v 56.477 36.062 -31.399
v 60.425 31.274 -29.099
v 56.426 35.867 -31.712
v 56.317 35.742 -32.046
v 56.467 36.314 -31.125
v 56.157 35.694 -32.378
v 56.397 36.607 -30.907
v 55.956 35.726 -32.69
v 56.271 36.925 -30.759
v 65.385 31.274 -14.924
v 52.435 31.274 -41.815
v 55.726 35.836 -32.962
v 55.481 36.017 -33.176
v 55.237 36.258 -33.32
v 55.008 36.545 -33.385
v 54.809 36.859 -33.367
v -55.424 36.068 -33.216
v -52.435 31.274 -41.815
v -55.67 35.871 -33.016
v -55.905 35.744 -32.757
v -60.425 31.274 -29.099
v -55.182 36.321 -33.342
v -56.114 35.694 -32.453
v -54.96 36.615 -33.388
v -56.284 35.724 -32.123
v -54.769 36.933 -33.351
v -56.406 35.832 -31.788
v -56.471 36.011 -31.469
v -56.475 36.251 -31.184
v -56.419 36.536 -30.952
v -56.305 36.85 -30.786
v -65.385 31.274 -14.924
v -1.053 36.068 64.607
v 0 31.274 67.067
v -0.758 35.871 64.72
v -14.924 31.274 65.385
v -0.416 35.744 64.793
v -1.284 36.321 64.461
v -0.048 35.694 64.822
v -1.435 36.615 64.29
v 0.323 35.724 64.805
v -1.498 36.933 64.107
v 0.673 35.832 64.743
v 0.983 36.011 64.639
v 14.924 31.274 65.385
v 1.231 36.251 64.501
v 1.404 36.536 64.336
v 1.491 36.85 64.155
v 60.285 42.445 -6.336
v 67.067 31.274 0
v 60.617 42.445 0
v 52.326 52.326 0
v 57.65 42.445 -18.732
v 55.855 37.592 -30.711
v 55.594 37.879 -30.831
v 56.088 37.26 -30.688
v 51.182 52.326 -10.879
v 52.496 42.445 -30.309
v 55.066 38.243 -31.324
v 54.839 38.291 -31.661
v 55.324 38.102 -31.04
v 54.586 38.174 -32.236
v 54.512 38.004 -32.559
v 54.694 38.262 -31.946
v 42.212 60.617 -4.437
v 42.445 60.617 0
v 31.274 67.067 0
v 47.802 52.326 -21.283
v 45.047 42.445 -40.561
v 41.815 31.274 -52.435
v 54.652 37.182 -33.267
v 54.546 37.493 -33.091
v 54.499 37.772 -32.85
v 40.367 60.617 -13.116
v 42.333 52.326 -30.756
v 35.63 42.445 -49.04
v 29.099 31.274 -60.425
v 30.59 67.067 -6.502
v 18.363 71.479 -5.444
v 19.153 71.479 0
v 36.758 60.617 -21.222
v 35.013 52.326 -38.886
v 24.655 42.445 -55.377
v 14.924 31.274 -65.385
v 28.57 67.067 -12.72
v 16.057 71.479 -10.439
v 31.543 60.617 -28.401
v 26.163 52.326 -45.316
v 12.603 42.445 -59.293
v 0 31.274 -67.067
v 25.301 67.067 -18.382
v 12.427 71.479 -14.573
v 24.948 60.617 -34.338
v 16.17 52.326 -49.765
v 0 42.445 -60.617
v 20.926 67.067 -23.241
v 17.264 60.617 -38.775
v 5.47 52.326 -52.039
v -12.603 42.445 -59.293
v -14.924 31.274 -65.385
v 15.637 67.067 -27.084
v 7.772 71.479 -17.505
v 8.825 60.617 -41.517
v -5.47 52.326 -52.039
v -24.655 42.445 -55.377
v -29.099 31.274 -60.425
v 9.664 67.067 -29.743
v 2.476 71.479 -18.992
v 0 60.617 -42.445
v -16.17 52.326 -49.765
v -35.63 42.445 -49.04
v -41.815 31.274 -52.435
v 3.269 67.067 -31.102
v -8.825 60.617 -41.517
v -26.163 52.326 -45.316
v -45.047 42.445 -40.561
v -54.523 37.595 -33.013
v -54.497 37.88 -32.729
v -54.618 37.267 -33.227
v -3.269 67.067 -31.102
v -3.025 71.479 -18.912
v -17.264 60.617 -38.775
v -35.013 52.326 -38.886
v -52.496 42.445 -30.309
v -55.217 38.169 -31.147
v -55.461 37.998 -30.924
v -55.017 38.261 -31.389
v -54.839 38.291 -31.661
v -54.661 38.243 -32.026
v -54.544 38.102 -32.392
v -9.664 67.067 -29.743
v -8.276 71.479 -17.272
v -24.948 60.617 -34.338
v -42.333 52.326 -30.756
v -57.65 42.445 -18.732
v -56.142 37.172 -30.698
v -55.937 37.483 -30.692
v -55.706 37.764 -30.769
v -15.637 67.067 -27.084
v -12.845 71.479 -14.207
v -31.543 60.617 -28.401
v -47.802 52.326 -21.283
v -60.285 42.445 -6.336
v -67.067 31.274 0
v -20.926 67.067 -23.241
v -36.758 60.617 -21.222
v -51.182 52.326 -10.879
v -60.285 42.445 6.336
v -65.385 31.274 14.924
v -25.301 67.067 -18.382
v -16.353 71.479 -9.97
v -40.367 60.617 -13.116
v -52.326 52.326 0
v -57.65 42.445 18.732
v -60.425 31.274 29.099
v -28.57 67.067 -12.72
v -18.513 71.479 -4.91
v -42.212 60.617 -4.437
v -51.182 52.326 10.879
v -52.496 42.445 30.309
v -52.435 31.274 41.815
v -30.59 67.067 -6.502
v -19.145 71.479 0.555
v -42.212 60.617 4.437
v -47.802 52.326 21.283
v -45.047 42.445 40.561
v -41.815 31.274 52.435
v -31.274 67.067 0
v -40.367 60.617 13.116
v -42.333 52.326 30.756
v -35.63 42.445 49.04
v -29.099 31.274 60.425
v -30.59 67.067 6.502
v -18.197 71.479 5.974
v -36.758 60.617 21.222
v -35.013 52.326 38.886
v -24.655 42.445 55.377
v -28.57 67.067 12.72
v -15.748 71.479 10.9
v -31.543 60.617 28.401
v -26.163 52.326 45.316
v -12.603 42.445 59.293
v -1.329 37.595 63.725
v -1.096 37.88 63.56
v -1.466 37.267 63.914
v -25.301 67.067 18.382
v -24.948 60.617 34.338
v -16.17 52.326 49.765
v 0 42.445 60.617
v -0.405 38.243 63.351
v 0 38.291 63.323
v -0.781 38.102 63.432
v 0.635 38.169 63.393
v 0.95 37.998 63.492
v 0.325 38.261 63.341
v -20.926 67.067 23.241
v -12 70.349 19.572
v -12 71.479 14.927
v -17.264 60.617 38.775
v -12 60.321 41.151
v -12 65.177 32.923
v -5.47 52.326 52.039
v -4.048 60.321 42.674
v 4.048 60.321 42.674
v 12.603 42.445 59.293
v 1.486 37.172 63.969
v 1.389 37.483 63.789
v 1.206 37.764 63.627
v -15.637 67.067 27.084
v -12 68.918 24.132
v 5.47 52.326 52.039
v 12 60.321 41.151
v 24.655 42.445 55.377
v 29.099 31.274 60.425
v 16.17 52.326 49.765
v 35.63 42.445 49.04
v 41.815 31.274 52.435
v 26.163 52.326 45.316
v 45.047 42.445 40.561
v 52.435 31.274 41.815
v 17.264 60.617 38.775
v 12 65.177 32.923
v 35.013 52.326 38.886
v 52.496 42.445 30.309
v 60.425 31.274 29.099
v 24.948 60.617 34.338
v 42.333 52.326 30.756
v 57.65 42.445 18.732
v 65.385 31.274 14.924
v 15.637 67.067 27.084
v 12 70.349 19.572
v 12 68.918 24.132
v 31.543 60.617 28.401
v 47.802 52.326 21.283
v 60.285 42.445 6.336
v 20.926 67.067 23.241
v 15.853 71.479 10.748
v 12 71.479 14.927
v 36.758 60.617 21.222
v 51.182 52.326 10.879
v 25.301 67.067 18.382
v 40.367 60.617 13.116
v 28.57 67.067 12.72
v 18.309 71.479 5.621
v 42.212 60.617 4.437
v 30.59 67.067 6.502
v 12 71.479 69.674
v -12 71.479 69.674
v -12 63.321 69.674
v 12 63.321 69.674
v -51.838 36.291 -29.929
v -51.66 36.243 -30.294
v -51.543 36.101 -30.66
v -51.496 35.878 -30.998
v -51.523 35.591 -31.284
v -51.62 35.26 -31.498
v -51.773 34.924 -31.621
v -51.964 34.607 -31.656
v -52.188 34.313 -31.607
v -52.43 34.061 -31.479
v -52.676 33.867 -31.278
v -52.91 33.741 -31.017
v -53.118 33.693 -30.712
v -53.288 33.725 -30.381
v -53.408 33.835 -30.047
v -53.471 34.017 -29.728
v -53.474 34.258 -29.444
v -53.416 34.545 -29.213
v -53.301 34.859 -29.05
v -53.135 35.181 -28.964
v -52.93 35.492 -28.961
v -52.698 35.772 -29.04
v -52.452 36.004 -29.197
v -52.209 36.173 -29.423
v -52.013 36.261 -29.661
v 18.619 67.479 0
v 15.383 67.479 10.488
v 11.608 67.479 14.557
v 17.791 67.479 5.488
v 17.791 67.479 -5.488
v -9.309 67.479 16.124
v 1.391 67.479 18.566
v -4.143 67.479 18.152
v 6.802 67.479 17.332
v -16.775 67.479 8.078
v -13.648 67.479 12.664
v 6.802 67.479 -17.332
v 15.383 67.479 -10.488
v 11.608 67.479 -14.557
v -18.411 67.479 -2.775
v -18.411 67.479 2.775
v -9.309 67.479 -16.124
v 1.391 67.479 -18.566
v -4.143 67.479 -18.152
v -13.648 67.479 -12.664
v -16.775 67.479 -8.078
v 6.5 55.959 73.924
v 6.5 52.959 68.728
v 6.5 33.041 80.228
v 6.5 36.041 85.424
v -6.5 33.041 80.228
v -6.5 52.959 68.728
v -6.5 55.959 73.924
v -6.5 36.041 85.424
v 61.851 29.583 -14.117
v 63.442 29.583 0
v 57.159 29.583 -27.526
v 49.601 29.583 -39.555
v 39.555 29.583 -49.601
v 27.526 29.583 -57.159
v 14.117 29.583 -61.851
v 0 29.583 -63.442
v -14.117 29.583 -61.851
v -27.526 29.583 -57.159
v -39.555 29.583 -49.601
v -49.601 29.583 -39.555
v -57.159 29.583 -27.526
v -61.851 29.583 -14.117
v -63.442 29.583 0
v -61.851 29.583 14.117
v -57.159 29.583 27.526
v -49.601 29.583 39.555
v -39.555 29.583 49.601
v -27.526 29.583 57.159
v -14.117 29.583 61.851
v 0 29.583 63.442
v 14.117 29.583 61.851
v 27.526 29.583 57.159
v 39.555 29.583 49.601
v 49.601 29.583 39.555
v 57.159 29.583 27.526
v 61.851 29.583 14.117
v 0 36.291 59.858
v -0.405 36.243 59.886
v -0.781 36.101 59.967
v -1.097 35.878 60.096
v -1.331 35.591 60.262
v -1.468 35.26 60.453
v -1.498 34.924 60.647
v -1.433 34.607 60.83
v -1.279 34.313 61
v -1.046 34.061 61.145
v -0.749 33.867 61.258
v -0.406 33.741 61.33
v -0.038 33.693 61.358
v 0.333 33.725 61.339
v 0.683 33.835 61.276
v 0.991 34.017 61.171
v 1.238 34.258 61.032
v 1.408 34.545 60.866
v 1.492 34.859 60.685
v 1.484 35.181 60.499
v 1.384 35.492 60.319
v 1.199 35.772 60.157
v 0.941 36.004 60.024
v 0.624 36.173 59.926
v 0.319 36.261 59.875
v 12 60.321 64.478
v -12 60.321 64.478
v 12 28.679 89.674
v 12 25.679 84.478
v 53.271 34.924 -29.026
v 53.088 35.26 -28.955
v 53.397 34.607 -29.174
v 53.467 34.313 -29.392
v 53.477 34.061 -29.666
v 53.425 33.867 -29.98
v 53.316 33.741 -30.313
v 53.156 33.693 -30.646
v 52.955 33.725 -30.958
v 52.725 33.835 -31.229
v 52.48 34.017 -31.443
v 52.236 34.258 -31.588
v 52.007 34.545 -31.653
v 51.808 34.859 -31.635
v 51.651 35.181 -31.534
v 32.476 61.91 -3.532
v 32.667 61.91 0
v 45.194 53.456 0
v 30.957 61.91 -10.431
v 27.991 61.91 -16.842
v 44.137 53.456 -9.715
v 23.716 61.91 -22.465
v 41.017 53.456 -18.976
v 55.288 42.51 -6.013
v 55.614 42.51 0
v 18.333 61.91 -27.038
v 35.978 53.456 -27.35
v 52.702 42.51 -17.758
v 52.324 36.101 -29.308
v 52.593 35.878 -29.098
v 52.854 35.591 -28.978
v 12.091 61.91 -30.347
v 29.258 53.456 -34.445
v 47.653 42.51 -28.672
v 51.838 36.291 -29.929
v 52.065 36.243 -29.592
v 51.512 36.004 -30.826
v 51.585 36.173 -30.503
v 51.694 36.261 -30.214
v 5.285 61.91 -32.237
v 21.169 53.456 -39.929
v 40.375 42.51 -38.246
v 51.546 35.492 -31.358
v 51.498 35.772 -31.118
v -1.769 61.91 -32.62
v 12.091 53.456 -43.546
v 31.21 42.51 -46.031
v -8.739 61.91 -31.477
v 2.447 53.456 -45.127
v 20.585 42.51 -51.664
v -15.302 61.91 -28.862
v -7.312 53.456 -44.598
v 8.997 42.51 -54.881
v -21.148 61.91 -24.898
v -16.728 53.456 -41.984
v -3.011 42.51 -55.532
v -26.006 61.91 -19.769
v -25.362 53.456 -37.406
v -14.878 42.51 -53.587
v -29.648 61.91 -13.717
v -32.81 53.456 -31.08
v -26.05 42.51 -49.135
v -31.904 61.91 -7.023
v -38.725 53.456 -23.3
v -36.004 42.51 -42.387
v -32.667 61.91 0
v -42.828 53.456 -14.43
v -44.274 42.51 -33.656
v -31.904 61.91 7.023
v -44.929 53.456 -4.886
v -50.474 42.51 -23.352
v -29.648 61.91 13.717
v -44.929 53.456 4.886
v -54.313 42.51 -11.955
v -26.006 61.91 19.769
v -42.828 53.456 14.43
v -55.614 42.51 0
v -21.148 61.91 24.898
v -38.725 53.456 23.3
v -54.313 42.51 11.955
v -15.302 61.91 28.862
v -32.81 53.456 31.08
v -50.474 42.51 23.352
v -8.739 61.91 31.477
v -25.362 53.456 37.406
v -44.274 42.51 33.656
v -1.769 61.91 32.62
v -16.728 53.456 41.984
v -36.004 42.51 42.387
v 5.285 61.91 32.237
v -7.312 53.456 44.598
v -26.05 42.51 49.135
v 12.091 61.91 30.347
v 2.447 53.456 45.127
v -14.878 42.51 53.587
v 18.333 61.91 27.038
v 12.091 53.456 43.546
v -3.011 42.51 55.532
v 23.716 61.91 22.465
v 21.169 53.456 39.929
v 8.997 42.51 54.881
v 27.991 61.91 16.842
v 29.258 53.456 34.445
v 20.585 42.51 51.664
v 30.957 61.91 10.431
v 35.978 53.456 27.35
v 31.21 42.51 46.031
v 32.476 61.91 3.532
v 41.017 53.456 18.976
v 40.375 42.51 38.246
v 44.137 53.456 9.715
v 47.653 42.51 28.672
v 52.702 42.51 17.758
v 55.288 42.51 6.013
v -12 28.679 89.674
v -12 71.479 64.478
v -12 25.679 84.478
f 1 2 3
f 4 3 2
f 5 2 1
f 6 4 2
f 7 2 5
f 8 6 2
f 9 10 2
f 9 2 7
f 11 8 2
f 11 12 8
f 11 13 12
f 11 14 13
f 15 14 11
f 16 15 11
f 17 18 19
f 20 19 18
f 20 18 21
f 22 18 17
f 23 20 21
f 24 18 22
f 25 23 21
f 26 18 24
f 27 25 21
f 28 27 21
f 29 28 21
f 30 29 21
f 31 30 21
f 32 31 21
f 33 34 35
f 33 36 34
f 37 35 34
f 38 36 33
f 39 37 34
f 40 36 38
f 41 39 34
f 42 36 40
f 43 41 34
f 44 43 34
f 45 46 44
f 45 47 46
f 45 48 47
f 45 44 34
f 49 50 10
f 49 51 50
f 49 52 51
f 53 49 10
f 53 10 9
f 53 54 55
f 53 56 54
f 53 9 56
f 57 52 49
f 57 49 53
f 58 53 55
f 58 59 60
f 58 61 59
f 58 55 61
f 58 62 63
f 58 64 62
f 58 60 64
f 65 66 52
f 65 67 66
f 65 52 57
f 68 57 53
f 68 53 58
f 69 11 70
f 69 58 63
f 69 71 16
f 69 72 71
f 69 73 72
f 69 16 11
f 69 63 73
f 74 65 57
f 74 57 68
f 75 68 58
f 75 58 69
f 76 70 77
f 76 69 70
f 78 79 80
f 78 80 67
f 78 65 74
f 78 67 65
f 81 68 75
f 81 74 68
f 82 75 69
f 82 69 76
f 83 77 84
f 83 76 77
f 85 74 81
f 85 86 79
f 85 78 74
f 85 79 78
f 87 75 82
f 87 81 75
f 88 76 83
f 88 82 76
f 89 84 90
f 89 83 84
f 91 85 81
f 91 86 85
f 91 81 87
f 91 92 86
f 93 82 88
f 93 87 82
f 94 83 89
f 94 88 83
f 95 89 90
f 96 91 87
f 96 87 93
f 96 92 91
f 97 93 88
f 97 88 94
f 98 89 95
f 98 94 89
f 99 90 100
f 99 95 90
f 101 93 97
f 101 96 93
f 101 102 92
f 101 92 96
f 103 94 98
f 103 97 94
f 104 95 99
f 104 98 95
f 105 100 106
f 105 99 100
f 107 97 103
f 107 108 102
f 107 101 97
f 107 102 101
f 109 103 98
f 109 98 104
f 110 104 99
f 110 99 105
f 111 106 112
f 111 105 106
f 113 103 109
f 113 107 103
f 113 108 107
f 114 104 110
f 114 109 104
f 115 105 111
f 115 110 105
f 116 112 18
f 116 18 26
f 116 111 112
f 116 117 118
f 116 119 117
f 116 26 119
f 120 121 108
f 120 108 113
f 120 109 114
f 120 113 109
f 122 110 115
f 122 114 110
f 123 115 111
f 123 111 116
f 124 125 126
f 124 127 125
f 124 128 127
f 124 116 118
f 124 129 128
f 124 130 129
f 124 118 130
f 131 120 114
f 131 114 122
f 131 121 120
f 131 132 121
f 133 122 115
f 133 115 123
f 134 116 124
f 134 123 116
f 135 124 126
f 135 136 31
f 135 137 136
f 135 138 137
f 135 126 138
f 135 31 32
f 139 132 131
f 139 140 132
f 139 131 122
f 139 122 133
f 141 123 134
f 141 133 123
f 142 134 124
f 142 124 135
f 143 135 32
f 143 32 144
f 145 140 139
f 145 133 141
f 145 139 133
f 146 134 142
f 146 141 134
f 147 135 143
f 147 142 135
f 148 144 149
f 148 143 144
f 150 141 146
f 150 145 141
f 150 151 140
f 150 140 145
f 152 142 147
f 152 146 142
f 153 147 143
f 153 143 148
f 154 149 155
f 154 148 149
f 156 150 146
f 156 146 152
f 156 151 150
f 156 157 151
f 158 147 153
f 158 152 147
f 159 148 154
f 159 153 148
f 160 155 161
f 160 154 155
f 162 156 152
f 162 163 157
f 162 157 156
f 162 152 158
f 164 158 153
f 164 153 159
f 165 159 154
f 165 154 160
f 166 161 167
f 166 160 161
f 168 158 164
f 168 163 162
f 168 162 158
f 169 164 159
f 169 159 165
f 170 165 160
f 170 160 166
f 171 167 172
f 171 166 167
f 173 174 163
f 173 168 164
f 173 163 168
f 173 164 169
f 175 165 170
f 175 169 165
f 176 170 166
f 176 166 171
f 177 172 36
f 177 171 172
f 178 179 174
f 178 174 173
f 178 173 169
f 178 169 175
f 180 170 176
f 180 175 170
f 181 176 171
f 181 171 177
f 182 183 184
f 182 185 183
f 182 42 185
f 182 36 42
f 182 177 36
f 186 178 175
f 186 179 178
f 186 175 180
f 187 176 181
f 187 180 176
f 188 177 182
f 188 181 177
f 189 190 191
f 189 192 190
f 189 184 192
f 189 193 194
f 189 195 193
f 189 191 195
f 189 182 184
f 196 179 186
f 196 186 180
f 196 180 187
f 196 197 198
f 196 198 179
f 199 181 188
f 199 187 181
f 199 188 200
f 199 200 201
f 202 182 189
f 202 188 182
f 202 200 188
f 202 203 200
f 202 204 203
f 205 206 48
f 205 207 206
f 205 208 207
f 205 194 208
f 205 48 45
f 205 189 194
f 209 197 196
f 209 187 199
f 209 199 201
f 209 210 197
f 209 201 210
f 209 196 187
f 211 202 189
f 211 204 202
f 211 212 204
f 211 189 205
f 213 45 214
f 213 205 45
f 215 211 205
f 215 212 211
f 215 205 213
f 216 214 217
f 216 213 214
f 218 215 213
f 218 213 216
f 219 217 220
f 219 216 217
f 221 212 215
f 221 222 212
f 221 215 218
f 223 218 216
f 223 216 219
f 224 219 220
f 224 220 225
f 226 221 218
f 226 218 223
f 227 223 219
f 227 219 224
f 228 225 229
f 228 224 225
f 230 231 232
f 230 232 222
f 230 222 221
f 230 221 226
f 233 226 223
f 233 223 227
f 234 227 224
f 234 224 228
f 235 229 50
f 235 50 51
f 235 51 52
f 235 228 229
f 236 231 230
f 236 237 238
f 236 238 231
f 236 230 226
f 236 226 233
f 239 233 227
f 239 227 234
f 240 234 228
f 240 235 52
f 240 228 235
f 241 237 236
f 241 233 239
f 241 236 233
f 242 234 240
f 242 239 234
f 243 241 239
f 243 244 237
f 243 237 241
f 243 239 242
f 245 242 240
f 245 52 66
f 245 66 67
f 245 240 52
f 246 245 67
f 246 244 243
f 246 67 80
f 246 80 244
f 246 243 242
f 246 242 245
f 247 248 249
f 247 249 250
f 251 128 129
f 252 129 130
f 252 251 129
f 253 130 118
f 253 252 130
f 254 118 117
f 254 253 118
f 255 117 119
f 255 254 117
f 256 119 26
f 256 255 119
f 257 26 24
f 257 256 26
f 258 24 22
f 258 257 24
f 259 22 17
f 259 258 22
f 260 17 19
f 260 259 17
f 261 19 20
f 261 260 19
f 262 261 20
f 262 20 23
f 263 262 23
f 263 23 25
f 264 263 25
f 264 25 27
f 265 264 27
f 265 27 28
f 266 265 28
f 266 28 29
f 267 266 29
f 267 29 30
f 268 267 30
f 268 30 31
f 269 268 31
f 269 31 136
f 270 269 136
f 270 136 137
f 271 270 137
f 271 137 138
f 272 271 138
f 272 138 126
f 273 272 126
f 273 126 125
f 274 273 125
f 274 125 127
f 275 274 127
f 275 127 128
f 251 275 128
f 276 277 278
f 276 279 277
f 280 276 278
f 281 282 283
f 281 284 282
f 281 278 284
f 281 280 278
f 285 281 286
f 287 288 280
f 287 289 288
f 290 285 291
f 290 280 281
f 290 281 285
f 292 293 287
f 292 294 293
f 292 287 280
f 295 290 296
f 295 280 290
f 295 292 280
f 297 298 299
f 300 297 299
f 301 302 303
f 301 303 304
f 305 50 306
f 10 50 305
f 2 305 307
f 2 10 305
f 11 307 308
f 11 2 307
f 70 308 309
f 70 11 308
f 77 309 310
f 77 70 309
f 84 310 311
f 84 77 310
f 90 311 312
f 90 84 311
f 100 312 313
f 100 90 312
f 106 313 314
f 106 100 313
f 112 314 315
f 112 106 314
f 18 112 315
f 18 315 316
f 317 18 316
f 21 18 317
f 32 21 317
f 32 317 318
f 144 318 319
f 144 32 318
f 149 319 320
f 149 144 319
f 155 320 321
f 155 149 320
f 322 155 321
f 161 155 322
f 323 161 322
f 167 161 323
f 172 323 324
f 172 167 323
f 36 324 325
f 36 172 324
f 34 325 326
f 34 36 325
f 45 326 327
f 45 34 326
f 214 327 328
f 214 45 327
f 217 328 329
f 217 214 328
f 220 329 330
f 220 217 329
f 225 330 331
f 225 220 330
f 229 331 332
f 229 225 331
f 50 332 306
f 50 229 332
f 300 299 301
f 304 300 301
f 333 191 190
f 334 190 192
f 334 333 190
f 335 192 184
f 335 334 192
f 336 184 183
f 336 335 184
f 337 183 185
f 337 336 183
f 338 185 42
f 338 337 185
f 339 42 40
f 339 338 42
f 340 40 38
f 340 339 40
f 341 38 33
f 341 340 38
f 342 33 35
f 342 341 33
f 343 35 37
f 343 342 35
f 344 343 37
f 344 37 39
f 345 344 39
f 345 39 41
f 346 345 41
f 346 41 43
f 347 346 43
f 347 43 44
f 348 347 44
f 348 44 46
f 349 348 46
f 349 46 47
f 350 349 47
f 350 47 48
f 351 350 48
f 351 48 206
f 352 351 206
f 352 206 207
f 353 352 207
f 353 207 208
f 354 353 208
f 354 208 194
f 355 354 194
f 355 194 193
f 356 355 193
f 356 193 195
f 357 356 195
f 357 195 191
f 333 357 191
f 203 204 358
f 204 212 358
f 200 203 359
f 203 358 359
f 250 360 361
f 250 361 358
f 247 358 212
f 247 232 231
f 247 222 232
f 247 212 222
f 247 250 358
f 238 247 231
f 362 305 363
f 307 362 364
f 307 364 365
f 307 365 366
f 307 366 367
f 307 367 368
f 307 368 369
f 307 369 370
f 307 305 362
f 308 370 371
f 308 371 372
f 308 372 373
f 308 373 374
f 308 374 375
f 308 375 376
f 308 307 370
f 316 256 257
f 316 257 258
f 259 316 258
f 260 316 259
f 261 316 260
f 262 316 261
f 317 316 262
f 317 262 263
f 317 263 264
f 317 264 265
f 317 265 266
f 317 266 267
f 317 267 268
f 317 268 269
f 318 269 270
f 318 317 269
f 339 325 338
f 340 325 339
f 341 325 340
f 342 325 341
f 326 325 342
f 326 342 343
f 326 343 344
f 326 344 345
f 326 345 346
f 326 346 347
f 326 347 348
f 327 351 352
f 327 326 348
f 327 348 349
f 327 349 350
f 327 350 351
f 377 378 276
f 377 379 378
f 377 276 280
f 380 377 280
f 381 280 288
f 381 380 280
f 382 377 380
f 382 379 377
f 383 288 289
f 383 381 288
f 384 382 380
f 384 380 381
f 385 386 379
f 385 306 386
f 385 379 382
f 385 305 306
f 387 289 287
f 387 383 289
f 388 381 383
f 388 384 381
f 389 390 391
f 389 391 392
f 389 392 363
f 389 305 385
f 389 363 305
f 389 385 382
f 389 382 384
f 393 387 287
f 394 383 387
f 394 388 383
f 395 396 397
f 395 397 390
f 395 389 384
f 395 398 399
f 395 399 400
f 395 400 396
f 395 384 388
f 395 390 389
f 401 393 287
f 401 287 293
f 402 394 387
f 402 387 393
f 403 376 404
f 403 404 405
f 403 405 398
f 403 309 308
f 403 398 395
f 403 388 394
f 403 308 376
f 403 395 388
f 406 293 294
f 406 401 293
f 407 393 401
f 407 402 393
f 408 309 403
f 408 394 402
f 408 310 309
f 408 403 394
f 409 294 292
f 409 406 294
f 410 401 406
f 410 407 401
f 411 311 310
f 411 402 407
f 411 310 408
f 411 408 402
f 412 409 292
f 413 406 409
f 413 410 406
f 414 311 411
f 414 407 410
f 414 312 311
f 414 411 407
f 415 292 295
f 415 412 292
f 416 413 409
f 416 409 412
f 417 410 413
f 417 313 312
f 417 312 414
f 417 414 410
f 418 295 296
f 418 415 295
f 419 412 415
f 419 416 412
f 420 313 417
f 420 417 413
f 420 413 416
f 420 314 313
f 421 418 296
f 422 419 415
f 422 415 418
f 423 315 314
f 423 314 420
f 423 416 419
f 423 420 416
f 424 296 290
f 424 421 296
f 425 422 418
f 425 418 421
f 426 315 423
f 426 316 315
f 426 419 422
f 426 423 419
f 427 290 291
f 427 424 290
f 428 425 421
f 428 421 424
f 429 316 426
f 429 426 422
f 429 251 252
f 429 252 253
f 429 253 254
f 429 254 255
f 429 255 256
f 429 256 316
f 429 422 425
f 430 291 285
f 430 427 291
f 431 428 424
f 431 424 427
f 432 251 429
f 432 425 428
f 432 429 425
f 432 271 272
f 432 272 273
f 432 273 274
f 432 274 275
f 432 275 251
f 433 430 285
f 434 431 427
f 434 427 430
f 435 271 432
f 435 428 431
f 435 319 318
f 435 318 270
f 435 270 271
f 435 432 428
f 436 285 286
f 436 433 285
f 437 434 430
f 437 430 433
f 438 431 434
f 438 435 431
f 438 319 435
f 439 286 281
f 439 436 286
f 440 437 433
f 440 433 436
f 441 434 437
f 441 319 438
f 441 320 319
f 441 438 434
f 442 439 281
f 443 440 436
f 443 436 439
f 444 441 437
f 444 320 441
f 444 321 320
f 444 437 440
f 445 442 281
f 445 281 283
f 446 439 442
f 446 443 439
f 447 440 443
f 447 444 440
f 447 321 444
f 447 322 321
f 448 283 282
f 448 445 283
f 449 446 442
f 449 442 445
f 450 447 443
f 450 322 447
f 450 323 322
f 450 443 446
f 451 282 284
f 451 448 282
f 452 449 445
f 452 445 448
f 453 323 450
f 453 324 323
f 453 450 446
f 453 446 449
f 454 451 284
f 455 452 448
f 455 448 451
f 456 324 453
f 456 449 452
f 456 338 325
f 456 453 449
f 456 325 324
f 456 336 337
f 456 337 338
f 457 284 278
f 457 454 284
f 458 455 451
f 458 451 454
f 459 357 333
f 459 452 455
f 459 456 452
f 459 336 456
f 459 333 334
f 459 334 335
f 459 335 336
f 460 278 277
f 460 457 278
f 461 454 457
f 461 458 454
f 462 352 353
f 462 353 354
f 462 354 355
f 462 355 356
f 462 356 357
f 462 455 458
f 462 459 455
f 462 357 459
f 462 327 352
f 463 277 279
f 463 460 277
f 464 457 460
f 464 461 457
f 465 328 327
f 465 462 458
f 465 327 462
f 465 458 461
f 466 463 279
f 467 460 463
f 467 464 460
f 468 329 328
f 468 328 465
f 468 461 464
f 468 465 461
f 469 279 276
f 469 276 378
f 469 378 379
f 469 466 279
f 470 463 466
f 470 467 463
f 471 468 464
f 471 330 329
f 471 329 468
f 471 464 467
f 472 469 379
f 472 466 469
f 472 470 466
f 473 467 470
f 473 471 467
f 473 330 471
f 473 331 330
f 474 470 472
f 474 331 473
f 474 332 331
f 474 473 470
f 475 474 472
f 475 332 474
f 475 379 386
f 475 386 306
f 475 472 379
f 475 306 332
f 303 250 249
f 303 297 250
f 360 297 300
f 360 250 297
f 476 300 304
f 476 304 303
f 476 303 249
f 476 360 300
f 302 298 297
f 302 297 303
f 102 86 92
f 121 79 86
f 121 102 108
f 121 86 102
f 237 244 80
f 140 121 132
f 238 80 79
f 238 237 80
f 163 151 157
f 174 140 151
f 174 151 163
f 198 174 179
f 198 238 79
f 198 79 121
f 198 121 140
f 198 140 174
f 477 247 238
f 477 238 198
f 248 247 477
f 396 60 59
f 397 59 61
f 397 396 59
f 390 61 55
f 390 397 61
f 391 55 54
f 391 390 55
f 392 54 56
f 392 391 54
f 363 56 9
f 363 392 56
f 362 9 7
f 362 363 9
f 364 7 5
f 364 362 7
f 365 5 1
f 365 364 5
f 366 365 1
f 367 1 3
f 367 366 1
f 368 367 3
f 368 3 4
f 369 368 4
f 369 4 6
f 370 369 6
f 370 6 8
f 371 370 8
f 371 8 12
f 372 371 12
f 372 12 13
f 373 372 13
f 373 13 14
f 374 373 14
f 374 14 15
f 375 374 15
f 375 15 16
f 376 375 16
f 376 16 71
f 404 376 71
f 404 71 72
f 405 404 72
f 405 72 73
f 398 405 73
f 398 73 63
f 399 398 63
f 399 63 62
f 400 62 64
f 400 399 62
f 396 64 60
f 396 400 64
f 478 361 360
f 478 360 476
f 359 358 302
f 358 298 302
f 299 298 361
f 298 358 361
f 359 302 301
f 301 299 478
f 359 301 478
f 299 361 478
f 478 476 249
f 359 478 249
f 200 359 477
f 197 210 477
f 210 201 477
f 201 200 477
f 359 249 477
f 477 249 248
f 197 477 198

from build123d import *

# Parameters (mm, degrees)
SKETCH_3_R               = 1.5
CUT_EXTRUDE_2_DEPTH      = 119.764820154
PATTERN_CIRCULAR_2_COUNT = 3
SKETCH_4_W               = 24
SKETCH_4_H               = 40
SKETCH_4_W_2             = 13
SKETCH_4_H_2             = 23
EXTRUDE_1_DEPTH          = 6
EXTRUDE_2_REACH          = 122.983
SKETCH_5_W               = 24
SKETCH_5_H               = 5.196152423
EXTRUDE_3_REACH          = 166.046
EXTRUDE_3_END_RADIUS     = 74
SKETCH_8_W               = 24
SKETCH_8_H               = 11.158003069


with BuildPart() as part:
    # 草图1 → 旋转1 (revolve)
    with BuildSketch(Plane.XY):
        with BuildLine():
            Line((19.152609338, 71.478511145), (0, 71.478511145))
            Line((0, 71.478511145), (0, 67.478511145))
            Line((0, 67.478511145), (18.618553478, 67.478511145))
            ThreePointArc((18.618553478, 67.478511145), (45.193772934, 53.455803127), (63.441545093, 29.583278322))
            Line((63.441545093, 29.583278322), (67.066776241, 31.273751369))
            ThreePointArc((67.066776241, 31.273751369), (47.566283117, 56.687288791), (19.152609338, 71.478511145))
        make_face()
    revolve(axis=Axis((0, 0, 0), (0, 1, 0)))

    # 草图3 → 切除-拉伸2 (cut, through all)
    with BuildSketch(Plane(origin=(0, 0, 0), x_dir=(-1, 0, 0), z_dir=(0, 0.500000000000001, 0.866025403784438))):
        with Locations(Location((0, 0, 0), (0, 0, 270))):
            Circle(SKETCH_3_R)
    cut_extrude_2 = extrude(amount=CUT_EXTRUDE_2_DEPTH, mode=Mode.SUBTRACT)

    # 阵列(圆周)2: 切除-拉伸2 ×3 about axis
    pattern_circular_2_axis = Axis((0, 71.478511145, 0), (0, -1, 0))
    for i in range(1, PATTERN_CIRCULAR_2_COUNT):
        add(cut_extrude_2.rotate(pattern_circular_2_axis, i * 360 / PATTERN_CIRCULAR_2_COUNT), mode=Mode.SUBTRACT)



with BuildPart() as body_2:
    # 草图4 → 凸台-拉伸1 (new body)
    with BuildSketch(Plane(origin=(0, 43, 74.478184725), x_dir=(-1, 0, 0), z_dir=(0, 0.500000000000001, 0.866025403784438))):
        Rectangle(SKETCH_4_W, SKETCH_4_H)
        Rectangle(SKETCH_4_W_2, SKETCH_4_H_2, mode=Mode.SUBTRACT)
    extrude(amount=EXTRUDE_1_DEPTH)

    # 草图5 → 凸台-拉伸2 (add, up to next)
    with BuildSketch(Plane(origin=(0, 71.478511145, 0), x_dir=(1, 0, 0), z_dir=(0, 1, 0)), mode=Mode.PRIVATE) as extrude_2_sk1:
        with Locations((0, -67.076260937)):
            Rectangle(SKETCH_5_W, SKETCH_5_H)
    extrude_2_tool1 = extrude(extrude_2_sk1.sketch, amount=-EXTRUDE_2_REACH, mode=Mode.PRIVATE) - body_2.part
    add(extrude_2_tool1.solids().sort_by_distance((0, 71.478511, 67.076261))[0])


with BuildPart() as part_1:
    add(part.part)

    add(body_2.part)  # 凸台-拉伸3 merges body 2
    # 凸台-拉伸3: up to this sphere (the profile starts outside it)
    extrude_3_end = Location((0, 0, 0)) * Sphere(EXTRUDE_3_END_RADIUS, mode=Mode.PRIVATE)
    # 草图8 → 凸台-拉伸3 (add, up to the surface)
    with BuildSketch(Plane(origin=(0, 0, 64.478184725), x_dir=(-1, 0, 0), z_dir=(0, 0, -1)), mode=Mode.PRIVATE) as extrude_3_sk1:
        with Locations((0, 65.899509611)):
            Rectangle(SKETCH_8_W, SKETCH_8_H)
    extrude_3_tool1 = extrude(extrude_3_sk1.sketch, amount=EXTRUDE_3_REACH, mode=Mode.PRIVATE) - extrude_3_end
    add(extrude_3_tool1.solids().sort_by_distance((0, 65.89951, 64.478185))[0])


solid = part_1.part
